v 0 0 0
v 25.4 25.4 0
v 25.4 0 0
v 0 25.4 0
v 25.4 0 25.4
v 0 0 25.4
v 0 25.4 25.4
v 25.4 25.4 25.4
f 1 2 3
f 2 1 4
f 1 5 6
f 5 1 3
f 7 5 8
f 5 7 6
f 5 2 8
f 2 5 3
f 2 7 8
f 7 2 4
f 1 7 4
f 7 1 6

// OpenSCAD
// Unit of length: Unit.MM
polyhedron(points = [[0.0, 0.0, 0.0], [25.4, 0.0, 0.0], [25.4, 25.4, 0.0], [0.0, 25.4, 0.0], [0.0, 0.0, 25.4], [25.4, 0.0, 25.4], [0.0, 25.4, 25.4], [25.4, 25.4, 25.4]], faces = [[0, 1, 2, 3], [4, 5, 1, 0], [6, 7, 5, 4], [5, 7, 2, 1], [7, 6, 3, 2], [6, 4, 0, 3]]);
